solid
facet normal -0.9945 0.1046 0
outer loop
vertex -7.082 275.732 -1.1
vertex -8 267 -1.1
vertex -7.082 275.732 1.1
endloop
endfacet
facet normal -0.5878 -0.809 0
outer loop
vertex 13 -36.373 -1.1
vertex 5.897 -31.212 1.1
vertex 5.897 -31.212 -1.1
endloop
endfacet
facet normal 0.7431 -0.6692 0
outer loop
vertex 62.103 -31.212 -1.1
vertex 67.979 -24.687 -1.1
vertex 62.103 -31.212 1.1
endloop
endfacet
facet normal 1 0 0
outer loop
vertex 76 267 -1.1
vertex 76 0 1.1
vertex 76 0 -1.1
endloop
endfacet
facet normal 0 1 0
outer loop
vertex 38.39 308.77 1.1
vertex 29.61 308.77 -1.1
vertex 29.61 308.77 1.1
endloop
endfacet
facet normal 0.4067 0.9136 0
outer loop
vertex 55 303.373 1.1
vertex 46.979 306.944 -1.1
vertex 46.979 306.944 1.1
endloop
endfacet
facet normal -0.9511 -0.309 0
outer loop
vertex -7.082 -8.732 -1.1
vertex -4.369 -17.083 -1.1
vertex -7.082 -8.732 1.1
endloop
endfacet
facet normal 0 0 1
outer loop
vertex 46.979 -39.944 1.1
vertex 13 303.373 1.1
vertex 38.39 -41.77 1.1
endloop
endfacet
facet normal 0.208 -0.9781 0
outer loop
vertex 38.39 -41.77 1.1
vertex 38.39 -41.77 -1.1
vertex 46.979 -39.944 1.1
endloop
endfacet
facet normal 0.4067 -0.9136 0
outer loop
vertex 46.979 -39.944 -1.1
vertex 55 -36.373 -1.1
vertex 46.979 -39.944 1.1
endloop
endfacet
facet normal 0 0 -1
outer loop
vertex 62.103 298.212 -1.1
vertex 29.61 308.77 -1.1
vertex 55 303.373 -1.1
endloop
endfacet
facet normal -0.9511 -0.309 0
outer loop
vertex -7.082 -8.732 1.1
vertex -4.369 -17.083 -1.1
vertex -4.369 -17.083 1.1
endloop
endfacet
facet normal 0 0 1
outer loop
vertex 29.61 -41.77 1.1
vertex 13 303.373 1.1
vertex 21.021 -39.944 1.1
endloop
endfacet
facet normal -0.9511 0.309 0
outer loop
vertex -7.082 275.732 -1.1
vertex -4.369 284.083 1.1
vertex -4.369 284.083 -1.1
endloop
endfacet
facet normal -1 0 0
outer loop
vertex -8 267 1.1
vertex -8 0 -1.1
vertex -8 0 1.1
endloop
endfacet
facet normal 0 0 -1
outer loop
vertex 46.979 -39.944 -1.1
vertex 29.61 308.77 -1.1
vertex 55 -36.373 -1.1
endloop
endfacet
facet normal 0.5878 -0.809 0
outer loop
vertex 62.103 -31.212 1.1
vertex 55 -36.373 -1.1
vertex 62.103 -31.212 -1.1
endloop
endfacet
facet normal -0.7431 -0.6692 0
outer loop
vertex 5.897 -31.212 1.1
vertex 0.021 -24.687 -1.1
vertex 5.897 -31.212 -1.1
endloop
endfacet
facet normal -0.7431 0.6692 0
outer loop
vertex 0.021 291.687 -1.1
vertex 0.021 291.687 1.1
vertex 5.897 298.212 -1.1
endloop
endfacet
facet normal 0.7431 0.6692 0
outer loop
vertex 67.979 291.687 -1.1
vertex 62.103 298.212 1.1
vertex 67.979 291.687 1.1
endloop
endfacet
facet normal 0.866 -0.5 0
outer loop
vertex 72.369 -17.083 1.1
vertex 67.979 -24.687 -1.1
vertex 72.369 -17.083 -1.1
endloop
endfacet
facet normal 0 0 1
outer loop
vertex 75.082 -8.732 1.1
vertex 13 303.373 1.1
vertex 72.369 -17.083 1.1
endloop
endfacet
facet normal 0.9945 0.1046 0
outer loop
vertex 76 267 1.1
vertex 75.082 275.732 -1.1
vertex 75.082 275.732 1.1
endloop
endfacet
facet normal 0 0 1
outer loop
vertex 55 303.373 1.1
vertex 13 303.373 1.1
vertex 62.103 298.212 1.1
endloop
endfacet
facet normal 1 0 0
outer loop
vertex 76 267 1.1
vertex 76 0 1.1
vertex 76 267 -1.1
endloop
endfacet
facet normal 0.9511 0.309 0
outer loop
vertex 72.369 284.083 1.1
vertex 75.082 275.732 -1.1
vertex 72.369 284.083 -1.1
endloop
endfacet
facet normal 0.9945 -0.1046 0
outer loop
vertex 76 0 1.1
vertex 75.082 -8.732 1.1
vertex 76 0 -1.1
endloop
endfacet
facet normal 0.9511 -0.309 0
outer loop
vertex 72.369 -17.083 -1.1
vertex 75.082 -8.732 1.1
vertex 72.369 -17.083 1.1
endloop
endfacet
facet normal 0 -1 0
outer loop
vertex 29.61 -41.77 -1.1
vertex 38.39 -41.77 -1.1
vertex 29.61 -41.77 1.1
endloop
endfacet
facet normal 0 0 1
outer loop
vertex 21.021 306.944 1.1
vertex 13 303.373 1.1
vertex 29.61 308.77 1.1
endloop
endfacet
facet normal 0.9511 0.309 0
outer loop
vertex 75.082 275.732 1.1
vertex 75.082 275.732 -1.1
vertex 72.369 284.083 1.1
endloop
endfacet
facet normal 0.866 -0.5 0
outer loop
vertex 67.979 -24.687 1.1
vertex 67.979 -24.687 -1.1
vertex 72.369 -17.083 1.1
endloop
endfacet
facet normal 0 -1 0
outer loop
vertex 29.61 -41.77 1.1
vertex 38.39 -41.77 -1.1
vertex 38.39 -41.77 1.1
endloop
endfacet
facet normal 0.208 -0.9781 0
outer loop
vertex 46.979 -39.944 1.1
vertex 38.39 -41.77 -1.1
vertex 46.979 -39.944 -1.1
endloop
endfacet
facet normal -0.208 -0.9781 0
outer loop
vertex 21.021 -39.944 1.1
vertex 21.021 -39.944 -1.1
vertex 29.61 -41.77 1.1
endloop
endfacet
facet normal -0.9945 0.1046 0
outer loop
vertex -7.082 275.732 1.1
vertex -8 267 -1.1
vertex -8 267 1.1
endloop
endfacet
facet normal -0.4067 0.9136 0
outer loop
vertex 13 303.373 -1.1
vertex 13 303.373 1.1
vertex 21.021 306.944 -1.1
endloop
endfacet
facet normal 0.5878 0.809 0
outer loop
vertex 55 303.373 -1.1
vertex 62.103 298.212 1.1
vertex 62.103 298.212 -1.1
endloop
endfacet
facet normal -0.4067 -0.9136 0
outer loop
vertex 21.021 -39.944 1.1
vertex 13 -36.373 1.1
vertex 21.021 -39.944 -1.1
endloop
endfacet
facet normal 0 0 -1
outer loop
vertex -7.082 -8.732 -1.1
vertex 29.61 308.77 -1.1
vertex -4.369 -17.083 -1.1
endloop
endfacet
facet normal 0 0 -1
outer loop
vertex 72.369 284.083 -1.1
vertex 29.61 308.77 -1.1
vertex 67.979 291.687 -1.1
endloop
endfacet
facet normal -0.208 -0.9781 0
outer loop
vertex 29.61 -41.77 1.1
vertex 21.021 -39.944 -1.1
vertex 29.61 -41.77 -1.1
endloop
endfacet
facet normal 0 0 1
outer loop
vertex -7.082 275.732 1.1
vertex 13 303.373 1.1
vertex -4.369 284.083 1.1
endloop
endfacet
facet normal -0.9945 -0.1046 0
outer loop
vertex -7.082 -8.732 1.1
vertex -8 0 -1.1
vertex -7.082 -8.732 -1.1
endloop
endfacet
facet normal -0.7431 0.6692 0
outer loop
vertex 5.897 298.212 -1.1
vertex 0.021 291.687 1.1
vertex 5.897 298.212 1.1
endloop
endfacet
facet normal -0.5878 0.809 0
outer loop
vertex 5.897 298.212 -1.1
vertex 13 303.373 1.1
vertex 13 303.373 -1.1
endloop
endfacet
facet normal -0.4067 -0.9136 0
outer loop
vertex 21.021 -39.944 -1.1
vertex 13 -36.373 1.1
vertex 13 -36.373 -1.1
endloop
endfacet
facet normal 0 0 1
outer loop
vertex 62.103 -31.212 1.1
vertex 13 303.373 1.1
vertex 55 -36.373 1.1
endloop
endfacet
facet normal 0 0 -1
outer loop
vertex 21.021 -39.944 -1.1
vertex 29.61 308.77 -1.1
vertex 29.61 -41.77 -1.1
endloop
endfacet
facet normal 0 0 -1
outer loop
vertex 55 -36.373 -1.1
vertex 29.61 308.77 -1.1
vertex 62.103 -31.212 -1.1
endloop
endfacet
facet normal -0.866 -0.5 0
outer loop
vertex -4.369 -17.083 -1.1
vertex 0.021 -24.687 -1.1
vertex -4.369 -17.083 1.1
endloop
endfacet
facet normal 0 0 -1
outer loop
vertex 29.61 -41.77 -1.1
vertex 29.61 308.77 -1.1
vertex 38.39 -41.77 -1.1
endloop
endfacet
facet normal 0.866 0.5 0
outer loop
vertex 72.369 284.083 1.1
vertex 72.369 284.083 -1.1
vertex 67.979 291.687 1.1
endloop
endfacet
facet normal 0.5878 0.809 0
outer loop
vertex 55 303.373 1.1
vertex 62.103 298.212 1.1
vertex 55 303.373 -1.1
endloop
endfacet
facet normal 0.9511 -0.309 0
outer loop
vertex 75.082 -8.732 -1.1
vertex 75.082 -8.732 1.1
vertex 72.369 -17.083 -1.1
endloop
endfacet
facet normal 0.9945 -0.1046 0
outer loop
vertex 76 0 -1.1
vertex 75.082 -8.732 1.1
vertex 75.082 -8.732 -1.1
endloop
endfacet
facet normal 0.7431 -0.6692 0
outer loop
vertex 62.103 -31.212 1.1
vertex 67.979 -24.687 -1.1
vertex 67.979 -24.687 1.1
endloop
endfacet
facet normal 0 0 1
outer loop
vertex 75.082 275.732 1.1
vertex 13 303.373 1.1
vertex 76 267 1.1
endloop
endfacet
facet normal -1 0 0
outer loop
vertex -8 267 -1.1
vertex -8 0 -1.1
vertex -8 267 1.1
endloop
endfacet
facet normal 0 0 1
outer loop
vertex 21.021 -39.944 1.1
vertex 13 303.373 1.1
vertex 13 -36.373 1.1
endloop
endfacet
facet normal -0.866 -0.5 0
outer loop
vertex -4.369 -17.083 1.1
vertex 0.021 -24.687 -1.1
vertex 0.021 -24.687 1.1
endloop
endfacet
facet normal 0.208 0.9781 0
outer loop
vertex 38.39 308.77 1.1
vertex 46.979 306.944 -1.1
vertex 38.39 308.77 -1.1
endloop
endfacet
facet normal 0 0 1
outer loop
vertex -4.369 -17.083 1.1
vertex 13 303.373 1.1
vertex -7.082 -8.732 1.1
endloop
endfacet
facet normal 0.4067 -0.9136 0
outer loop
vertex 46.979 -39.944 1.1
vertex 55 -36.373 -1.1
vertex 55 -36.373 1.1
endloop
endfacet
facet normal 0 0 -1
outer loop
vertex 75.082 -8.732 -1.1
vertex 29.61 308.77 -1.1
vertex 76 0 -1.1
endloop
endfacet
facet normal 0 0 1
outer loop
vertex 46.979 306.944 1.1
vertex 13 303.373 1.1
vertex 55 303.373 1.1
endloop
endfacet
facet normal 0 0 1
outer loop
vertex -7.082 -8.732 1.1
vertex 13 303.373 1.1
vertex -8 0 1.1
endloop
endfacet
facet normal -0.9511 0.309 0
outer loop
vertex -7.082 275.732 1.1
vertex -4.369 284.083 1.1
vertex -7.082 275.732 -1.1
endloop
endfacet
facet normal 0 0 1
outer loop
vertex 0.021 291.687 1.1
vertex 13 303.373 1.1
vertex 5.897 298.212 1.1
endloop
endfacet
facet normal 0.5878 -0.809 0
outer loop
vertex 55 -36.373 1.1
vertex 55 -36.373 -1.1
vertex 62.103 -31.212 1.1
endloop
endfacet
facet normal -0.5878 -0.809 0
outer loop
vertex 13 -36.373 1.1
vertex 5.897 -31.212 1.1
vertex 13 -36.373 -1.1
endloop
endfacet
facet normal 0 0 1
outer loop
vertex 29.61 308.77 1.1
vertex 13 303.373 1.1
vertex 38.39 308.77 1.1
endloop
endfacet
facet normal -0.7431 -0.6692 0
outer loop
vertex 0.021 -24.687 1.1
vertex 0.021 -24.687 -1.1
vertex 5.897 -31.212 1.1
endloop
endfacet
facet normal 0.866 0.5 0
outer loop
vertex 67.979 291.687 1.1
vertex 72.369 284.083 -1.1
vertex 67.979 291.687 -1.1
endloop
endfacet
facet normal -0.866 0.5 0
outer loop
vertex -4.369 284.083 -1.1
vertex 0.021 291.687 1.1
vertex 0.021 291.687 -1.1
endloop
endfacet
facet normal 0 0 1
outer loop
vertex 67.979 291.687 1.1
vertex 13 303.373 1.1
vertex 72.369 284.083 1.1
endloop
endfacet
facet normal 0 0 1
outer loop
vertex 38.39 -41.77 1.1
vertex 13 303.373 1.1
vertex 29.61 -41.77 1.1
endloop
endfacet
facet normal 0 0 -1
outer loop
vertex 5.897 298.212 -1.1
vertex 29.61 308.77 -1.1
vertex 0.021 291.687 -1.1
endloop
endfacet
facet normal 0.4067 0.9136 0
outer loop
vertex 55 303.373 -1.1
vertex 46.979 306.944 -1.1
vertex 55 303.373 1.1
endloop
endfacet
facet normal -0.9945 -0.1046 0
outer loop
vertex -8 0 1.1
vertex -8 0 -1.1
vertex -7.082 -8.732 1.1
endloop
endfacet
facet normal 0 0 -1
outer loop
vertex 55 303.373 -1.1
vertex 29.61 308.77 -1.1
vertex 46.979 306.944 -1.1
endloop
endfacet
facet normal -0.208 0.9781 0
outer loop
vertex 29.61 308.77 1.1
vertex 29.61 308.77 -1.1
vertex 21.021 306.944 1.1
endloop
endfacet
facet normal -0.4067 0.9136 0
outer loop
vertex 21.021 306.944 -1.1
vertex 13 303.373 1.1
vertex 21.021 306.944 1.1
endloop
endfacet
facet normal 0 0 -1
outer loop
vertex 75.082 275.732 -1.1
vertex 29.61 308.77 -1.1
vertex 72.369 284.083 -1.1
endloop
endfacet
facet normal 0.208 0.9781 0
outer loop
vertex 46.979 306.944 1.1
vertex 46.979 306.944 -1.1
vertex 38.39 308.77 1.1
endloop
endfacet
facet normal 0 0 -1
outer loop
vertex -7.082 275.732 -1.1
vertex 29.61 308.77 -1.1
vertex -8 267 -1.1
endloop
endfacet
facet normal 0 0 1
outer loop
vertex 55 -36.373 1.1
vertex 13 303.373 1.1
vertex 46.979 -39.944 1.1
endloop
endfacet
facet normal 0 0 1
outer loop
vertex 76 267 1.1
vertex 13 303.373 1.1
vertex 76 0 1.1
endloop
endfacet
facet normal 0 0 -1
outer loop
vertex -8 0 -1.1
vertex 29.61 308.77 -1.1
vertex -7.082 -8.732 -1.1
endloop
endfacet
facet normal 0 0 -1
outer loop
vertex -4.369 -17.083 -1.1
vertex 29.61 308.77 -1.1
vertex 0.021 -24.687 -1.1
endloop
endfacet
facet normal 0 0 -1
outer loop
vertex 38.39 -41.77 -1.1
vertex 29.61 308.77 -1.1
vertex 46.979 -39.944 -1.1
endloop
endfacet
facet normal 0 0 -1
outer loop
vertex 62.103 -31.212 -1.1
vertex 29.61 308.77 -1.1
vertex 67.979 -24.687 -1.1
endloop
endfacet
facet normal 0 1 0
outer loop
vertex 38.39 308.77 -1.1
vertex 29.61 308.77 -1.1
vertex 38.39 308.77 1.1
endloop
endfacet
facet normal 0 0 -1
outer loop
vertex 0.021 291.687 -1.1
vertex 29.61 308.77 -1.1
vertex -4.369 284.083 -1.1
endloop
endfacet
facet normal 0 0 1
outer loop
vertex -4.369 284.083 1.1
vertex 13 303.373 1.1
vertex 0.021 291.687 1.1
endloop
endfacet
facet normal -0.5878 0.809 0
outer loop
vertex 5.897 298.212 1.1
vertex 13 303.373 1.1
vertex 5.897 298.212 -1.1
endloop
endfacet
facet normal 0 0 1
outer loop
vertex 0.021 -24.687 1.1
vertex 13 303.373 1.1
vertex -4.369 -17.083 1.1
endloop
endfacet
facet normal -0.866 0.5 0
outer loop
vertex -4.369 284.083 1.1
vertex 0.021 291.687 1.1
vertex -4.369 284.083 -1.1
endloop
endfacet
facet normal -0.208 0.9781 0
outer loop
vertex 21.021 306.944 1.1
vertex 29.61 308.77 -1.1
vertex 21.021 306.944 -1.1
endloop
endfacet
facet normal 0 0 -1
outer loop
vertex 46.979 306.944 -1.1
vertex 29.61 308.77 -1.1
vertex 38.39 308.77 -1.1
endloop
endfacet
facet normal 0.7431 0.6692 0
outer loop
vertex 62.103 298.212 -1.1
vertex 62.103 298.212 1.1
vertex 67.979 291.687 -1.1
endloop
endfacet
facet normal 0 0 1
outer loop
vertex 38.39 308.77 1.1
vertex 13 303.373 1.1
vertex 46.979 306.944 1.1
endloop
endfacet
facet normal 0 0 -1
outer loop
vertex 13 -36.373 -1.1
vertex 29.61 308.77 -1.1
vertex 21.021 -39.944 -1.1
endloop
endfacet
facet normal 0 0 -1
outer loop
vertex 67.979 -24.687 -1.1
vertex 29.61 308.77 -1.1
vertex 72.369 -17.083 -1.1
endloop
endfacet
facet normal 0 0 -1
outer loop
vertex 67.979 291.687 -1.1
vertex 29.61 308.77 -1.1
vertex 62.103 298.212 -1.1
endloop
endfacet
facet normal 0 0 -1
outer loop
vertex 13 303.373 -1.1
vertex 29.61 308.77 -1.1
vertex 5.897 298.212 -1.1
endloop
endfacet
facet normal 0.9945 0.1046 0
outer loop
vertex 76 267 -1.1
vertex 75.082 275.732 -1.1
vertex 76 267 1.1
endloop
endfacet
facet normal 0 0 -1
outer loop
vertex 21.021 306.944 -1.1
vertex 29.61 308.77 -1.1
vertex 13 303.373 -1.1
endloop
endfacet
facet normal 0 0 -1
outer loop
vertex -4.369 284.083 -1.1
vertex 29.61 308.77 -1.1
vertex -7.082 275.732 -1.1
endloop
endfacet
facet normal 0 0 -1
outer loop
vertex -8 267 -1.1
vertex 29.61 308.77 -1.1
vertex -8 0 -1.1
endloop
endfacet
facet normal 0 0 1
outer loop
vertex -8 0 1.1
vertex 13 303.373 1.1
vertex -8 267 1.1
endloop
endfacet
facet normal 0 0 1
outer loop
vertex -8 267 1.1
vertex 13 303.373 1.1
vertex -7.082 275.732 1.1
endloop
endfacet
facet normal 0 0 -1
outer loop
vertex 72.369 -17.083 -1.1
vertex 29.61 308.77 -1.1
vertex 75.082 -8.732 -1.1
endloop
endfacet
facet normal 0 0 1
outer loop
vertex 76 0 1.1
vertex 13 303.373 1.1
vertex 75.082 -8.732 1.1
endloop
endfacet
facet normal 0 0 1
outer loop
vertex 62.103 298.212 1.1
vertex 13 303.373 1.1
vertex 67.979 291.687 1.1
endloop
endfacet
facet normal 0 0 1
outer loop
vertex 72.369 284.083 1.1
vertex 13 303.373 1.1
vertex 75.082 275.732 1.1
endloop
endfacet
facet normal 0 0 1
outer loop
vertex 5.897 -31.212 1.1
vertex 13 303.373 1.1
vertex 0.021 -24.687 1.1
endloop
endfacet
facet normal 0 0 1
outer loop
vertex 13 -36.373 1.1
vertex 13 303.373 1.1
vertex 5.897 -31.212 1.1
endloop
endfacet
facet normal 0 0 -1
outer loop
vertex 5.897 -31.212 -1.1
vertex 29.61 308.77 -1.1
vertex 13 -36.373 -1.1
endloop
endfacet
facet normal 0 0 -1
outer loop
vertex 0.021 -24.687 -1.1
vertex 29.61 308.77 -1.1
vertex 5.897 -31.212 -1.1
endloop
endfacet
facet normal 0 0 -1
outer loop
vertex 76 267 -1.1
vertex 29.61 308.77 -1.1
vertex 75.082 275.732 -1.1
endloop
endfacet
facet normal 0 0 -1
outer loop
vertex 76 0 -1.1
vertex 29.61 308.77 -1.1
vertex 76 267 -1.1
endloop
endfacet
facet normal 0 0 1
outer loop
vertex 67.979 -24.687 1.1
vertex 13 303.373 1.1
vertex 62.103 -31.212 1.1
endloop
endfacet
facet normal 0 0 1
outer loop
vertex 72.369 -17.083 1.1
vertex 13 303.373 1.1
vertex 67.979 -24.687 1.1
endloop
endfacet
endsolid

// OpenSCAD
// Clock design by BananaC9 / Juan García

PCB_HEIGHT = 68; // Size of PCB in mm
PCB_WIDTH = 267; // Size of PCB in mm267
NUMBER_LEDS_HORIZONTAL=32; // Number of Leds in a row
NUMBER_LEDS_VERTICAL=8;   // Number of Leds in a column
DIFFUSER_HEIGHT = 0.2; // Height of diffuser
LED_SIZE = 5; // Size of leds in mm
DISTANCE_BETWEEN_LEDS=3.3; // Distance between leds in mm
WALL_THICKNESS=1; // Thinkess of walls
PCB_BORDER = 1;  // PCB Outer Boarder in mm
ROUNDED_END_RADIUS = 35;
buffer=DISTANCE_BETWEEN_LEDS-WALL_THICKNESS;
THICK_BORDER = PCB_BORDER - WALL_THICKNESS;


difference() {

// Create Main PCB Diffuser
    union() {
        hull() {
            cube([PCB_HEIGHT, PCB_WIDTH, DIFFUSER_HEIGHT]);
            translate([PCB_HEIGHT/2, 0, 0]) cylinder(h = DIFFUSER_HEIGHT + 2, r = ROUNDED_END_RADIUS * 1.2, center = true);
            translate([PCB_HEIGHT - ROUNDED_END_RADIUS, 0, 0]) cylinder(h = DIFFUSER_HEIGHT, r = ROUNDED_END_RADIUS, center = true);
            translate([PCB_HEIGHT/2, PCB_WIDTH, 0]) cylinder(h = DIFFUSER_HEIGHT + 2, r = ROUNDED_END_RADIUS * 1.2, center = true);
        }
    }
    
    /*
    translate([-50, 0, -5]) {
    cube([PCB_HEIGHT*2, PCB_WIDTH, 10]);
    }
    
    //left of center part
    translate([-50, 0, -5]) {
    cube([PCB_HEIGHT*2, PCB_WIDTH/2, 10]);
    }
    
    //right of center part
    
    translate([-50, PCB_WIDTH/2, -5]) {
    cube([PCB_HEIGHT*2, PCB_WIDTH/2, 10]);
    }
    
    translate([-50, -PCB_WIDTH, -5]) {
    cube([PCB_HEIGHT*2, PCB_WIDTH, 10]);
    }
    
    translate([-50, PCB_WIDTH, -5]) {
    cube([PCB_HEIGHT*2, PCB_WIDTH, 10]);
    }
    */
    
}
